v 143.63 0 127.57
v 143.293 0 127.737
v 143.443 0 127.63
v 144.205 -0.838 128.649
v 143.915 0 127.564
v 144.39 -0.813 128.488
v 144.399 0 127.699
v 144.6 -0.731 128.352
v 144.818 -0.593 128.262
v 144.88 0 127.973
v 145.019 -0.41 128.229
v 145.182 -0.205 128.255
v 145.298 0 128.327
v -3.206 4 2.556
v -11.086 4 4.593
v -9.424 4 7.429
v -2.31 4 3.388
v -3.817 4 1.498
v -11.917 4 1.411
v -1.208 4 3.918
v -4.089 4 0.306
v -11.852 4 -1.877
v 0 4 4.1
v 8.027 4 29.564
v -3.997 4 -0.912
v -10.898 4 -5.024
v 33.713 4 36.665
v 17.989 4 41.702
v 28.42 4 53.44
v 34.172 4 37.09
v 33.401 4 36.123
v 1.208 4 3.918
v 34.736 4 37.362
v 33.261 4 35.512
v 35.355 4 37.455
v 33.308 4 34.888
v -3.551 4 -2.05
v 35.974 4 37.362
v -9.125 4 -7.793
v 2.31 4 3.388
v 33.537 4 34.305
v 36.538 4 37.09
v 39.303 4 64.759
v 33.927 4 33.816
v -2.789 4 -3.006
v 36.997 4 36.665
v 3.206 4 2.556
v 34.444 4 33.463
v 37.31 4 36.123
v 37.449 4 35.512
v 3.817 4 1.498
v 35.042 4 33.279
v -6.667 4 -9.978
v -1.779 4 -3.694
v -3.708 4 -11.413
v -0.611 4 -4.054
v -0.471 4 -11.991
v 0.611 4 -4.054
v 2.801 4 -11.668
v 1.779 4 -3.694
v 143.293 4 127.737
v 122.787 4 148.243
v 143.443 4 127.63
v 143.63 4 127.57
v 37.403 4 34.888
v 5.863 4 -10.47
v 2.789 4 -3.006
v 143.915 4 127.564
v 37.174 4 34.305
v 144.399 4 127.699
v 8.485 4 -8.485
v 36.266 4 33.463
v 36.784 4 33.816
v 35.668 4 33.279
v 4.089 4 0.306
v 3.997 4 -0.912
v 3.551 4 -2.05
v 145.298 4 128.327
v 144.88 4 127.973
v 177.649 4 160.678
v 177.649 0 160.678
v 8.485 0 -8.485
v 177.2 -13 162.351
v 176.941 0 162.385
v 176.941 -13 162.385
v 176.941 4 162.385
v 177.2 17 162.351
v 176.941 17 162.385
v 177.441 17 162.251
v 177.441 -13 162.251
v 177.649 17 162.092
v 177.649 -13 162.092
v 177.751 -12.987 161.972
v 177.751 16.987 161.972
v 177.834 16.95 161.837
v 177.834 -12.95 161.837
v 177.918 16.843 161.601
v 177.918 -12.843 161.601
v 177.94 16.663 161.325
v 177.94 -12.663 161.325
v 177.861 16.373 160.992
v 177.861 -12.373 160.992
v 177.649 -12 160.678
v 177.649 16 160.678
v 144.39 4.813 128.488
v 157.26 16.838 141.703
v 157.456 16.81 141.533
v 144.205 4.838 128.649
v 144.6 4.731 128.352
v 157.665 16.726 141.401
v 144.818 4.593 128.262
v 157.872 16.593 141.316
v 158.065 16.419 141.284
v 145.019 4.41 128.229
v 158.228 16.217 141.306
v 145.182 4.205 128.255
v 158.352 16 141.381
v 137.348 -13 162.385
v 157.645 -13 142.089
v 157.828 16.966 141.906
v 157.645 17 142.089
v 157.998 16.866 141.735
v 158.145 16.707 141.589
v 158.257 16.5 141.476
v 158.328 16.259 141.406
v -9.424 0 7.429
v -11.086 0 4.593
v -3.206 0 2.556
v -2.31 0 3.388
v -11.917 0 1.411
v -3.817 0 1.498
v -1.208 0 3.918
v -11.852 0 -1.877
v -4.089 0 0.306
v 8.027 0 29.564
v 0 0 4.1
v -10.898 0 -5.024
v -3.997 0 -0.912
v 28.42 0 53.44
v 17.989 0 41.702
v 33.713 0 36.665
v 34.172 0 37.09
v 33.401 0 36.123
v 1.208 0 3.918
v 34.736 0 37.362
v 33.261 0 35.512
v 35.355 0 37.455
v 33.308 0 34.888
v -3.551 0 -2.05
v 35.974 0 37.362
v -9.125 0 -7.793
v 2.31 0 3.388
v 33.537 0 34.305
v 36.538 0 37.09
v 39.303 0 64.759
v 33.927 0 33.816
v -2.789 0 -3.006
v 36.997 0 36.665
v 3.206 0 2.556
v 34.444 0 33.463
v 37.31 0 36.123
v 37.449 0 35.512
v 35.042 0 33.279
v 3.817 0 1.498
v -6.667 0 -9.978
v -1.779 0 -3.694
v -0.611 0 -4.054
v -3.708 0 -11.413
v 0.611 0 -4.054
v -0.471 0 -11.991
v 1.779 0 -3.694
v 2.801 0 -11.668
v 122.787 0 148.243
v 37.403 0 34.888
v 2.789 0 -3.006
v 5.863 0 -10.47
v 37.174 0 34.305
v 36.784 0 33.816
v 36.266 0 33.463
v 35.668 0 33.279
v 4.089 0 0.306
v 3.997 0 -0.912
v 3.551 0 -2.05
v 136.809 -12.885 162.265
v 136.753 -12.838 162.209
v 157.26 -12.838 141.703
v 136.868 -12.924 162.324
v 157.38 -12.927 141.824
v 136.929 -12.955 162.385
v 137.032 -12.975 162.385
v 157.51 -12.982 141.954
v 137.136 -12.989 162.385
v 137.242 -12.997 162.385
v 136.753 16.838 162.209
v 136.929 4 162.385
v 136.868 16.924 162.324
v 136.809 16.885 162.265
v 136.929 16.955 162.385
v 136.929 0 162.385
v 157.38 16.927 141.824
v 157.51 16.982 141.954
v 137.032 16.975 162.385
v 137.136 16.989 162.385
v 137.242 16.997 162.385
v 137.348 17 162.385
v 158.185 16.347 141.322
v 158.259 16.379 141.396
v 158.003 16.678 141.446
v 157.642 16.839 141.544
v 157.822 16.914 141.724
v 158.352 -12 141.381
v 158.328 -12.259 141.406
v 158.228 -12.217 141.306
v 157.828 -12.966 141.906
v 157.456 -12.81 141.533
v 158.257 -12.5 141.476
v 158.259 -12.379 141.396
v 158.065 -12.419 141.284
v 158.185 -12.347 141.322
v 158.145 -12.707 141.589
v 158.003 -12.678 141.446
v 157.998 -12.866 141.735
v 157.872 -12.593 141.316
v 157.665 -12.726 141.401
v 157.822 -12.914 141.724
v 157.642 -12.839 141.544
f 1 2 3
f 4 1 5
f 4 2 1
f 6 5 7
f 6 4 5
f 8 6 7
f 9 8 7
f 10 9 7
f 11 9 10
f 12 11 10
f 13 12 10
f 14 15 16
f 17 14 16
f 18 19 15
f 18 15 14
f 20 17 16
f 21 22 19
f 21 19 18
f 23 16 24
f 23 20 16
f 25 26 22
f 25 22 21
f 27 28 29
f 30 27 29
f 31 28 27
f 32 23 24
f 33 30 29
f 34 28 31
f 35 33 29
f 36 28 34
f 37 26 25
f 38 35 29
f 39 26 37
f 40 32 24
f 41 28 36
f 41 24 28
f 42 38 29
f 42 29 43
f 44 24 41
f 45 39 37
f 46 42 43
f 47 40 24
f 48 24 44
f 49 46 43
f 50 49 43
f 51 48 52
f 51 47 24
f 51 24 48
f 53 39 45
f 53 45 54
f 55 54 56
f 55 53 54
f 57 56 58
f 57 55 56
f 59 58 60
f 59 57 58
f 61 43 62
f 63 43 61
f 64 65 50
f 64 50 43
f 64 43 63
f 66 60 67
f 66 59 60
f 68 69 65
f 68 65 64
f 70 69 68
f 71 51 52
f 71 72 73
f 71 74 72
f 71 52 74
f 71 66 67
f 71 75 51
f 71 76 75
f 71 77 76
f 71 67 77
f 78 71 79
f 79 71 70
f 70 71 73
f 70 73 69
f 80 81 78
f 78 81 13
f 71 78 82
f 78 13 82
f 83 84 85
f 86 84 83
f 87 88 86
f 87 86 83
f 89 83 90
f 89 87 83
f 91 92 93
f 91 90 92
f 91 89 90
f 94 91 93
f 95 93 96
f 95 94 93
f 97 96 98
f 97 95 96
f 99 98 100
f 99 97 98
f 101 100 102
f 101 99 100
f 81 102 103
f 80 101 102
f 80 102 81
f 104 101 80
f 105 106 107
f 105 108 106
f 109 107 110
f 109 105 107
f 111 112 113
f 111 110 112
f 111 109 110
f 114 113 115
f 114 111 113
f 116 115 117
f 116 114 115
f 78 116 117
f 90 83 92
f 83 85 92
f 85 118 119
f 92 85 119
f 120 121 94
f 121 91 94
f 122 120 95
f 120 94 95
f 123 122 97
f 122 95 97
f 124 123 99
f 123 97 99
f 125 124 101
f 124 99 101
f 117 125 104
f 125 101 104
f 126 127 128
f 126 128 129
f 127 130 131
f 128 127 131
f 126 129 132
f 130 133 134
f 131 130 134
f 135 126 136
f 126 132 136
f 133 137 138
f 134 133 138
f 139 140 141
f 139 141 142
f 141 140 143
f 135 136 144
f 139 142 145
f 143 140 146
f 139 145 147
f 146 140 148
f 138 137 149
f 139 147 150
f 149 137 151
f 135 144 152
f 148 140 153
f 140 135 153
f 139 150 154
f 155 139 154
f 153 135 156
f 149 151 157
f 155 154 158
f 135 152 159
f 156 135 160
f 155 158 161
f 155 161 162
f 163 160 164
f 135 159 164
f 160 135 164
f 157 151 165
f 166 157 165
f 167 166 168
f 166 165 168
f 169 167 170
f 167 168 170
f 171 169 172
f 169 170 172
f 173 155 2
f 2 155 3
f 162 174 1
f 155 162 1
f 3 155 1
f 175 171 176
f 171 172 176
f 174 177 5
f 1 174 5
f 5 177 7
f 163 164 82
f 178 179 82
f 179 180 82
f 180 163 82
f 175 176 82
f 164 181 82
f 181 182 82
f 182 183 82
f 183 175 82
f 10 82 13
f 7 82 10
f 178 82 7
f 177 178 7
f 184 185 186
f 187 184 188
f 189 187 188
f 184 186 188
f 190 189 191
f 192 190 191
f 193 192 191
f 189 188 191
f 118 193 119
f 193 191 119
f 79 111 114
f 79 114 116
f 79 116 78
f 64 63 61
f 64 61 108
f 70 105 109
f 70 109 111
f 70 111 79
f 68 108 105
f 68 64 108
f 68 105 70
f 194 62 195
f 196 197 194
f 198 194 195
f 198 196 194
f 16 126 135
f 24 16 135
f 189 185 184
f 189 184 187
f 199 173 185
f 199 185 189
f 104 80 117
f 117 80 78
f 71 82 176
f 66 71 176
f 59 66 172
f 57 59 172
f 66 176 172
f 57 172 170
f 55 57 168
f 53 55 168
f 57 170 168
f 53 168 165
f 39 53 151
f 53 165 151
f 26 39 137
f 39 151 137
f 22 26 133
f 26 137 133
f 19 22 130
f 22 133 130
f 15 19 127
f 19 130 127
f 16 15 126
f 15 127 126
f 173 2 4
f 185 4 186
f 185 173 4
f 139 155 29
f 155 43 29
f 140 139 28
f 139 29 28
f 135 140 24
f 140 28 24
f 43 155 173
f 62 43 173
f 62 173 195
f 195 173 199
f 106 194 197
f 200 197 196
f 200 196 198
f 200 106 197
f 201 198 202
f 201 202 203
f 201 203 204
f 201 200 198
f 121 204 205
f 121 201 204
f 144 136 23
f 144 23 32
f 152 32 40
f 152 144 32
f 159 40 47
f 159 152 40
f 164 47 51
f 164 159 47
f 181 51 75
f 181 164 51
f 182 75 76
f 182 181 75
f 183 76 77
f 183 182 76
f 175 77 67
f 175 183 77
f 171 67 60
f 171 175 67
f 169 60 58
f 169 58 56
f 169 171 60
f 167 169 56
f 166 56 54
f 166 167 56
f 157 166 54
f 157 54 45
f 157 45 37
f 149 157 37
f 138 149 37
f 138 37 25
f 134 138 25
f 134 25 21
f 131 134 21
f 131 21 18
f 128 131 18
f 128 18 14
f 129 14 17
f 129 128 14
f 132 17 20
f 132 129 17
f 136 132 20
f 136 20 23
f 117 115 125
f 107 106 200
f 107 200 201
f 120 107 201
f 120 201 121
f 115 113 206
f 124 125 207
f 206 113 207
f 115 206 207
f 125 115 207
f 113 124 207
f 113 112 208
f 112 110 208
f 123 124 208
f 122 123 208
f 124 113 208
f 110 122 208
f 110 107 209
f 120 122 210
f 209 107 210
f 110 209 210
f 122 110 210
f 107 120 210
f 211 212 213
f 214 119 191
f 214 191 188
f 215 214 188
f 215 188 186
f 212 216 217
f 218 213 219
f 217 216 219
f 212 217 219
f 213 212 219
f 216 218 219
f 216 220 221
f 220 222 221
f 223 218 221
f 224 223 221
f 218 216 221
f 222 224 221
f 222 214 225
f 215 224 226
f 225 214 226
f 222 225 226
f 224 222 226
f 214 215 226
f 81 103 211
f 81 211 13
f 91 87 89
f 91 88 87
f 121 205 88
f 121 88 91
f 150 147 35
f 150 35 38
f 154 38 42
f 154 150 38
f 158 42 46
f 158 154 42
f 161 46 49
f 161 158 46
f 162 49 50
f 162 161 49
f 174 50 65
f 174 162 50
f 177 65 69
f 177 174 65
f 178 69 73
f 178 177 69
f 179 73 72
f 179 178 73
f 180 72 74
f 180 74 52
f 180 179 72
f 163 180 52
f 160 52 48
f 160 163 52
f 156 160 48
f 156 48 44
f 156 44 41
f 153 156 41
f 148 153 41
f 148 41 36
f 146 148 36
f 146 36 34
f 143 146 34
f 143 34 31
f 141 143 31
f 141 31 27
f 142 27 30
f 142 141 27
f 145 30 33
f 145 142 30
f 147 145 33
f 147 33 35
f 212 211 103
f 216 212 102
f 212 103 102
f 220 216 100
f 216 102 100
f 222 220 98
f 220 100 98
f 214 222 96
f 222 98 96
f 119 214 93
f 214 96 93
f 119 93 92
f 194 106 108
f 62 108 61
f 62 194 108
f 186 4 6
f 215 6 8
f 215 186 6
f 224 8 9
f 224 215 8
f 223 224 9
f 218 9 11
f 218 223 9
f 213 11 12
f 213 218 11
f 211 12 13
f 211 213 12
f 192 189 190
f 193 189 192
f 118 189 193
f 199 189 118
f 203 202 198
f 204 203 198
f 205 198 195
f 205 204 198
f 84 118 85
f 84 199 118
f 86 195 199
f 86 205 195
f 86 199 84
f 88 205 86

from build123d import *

# Parameters (mm, degrees)
SKETCH_2_R      = 4.1
SKETCH_2_R_2    = 2.1
EXTRUDE_1_DEPTH = 4
FILLET_1_R      = 400
EXTRUDE_4_DEPTH = 30
EXTRUDE_5_REACH = 231.249
SKETCH_8_W      = 30
SKETCH_8_H      = 13
FILLET_5_R      = 1


with BuildPart() as part:
    # 草图2 → 凸台-拉伸1 (new body)
    with BuildSketch(Plane(origin=(0, 0, 0), x_dir=(1, 0, 0), z_dir=(0, 1, 0))):
        with BuildLine():
            Line((136.929210249, -162.385054371), (179.35561712, -162.385054371))
            Line((179.35561712, -162.385054371), (8.485281374, 8.485281374))
            ThreePointArc((8.485281374, 8.485281374), (-7.971171133, 8.969973844), (-9.423568154, -7.429425499))
            Line((-9.423568154, -7.429425499), (22.627416998, -48.083261121))
            Line((22.627416998, -48.083261121), (136.929210249, -162.385054371))
        make_face()
        with Locations(Location((0, 0, 0), (0, 0, 270))):
            Circle(SKETCH_2_R, mode=Mode.SUBTRACT)
        with Locations(Location((35.355339059, -35.355339059, 0), (0, 0, 270))):
            Circle(SKETCH_2_R_2, mode=Mode.SUBTRACT)
    extrude(amount=EXTRUDE_1_DEPTH)

    # 圆角1
    fillet_1_edges = [part.edges().sort_by_distance(p)[0] for p in [
        (22.627416998, 2, 48.083261121),
    ]]
    fillet(fillet_1_edges, radius=FILLET_1_R)

    # 草图6 → 凸台-拉伸4 (add)
    with BuildSketch(Plane(origin=(-12.727922061, 0, 12.727922061), x_dir=(0.7071067811865476, 0, 0.7071067811865475), z_dir=(-0.7071067811865475, 0, 0.7071067811865476))):
        Polygon((191.647146219, 4), (191.647146219, 0), (211.647146219, -13), (211.647146219, 17), align=None)
    extrude(amount=-EXTRUDE_4_DEPTH)

    # 凸台-拉伸5: up to this face of the body (flat: up to its plane)
    extrude_5_end = Plane(part.part.faces().sort_by_distance((158.142413684, 2, 162.385054371))[0])
    # 草图8 → 凸台-拉伸5 (add, up to the picked face)
    with BuildSketch(Plane(origin=(149.65713231, 0, 149.65713231), x_dir=(0.7071067811865475, 0, -0.7071067811865476), z_dir=(0.7071067811865476, 0, 0.7071067811865475)), mode=Mode.PRIVATE) as extrude_5_sk1:
        with Locations((-3, 10.5)):
            Rectangle(SKETCH_8_W, SKETCH_8_H)
    extrude_5_tool1 = split(extrude(extrude_5_sk1.sketch, amount=EXTRUDE_5_REACH, mode=Mode.PRIVATE), bisect_by=extrude_5_end, keep=Keep.BOTH, mode=Mode.PRIVATE)
    # 草图8 → 凸台-拉伸5 (add, up to the picked face)
    with BuildSketch(Plane(origin=(149.65713231, 0, 149.65713231), x_dir=(0.7071067811865475, 0, -0.7071067811865476), z_dir=(0.7071067811865476, 0, 0.7071067811865475)), mode=Mode.PRIVATE) as extrude_5_sk2:
        with Locations((-3, -6.5)):
            Rectangle(SKETCH_8_W, SKETCH_8_H)
    extrude_5_tool2 = split(extrude(extrude_5_sk2.sketch, amount=EXTRUDE_5_REACH, mode=Mode.PRIVATE), bisect_by=extrude_5_end, keep=Keep.BOTH, mode=Mode.PRIVATE)
    add(extrude_5_tool1.solids().sort_by(Axis((147.535812, 10.5, 151.778453), (0.7071067811865476, 0, 0.7071067811865475)))[0])
    add(extrude_5_tool2.solids().sort_by(Axis((147.535812, -6.5, 151.778453), (0.7071067811865476, 0, 0.7071067811865475)))[0])

    # 圆角5
    fillet_5_edges = [part.edges().sort_by_distance(p)[0] for p in [
        (147.535811966, 17, 151.778452653),
        (151.071345872, -6.5, 134.100783124),
        (147.535811966, -13, 151.778452653),
        (151.071345872, 10.5, 134.100783124),
        (168.749015402, 17, 151.778452653),
        (168.749015402, -13, 151.778452653),
        (179.35561712, 2, 162.385054371),
    ]]
    fillet(fillet_5_edges, radius=FILLET_5_R)


solid = part.part
